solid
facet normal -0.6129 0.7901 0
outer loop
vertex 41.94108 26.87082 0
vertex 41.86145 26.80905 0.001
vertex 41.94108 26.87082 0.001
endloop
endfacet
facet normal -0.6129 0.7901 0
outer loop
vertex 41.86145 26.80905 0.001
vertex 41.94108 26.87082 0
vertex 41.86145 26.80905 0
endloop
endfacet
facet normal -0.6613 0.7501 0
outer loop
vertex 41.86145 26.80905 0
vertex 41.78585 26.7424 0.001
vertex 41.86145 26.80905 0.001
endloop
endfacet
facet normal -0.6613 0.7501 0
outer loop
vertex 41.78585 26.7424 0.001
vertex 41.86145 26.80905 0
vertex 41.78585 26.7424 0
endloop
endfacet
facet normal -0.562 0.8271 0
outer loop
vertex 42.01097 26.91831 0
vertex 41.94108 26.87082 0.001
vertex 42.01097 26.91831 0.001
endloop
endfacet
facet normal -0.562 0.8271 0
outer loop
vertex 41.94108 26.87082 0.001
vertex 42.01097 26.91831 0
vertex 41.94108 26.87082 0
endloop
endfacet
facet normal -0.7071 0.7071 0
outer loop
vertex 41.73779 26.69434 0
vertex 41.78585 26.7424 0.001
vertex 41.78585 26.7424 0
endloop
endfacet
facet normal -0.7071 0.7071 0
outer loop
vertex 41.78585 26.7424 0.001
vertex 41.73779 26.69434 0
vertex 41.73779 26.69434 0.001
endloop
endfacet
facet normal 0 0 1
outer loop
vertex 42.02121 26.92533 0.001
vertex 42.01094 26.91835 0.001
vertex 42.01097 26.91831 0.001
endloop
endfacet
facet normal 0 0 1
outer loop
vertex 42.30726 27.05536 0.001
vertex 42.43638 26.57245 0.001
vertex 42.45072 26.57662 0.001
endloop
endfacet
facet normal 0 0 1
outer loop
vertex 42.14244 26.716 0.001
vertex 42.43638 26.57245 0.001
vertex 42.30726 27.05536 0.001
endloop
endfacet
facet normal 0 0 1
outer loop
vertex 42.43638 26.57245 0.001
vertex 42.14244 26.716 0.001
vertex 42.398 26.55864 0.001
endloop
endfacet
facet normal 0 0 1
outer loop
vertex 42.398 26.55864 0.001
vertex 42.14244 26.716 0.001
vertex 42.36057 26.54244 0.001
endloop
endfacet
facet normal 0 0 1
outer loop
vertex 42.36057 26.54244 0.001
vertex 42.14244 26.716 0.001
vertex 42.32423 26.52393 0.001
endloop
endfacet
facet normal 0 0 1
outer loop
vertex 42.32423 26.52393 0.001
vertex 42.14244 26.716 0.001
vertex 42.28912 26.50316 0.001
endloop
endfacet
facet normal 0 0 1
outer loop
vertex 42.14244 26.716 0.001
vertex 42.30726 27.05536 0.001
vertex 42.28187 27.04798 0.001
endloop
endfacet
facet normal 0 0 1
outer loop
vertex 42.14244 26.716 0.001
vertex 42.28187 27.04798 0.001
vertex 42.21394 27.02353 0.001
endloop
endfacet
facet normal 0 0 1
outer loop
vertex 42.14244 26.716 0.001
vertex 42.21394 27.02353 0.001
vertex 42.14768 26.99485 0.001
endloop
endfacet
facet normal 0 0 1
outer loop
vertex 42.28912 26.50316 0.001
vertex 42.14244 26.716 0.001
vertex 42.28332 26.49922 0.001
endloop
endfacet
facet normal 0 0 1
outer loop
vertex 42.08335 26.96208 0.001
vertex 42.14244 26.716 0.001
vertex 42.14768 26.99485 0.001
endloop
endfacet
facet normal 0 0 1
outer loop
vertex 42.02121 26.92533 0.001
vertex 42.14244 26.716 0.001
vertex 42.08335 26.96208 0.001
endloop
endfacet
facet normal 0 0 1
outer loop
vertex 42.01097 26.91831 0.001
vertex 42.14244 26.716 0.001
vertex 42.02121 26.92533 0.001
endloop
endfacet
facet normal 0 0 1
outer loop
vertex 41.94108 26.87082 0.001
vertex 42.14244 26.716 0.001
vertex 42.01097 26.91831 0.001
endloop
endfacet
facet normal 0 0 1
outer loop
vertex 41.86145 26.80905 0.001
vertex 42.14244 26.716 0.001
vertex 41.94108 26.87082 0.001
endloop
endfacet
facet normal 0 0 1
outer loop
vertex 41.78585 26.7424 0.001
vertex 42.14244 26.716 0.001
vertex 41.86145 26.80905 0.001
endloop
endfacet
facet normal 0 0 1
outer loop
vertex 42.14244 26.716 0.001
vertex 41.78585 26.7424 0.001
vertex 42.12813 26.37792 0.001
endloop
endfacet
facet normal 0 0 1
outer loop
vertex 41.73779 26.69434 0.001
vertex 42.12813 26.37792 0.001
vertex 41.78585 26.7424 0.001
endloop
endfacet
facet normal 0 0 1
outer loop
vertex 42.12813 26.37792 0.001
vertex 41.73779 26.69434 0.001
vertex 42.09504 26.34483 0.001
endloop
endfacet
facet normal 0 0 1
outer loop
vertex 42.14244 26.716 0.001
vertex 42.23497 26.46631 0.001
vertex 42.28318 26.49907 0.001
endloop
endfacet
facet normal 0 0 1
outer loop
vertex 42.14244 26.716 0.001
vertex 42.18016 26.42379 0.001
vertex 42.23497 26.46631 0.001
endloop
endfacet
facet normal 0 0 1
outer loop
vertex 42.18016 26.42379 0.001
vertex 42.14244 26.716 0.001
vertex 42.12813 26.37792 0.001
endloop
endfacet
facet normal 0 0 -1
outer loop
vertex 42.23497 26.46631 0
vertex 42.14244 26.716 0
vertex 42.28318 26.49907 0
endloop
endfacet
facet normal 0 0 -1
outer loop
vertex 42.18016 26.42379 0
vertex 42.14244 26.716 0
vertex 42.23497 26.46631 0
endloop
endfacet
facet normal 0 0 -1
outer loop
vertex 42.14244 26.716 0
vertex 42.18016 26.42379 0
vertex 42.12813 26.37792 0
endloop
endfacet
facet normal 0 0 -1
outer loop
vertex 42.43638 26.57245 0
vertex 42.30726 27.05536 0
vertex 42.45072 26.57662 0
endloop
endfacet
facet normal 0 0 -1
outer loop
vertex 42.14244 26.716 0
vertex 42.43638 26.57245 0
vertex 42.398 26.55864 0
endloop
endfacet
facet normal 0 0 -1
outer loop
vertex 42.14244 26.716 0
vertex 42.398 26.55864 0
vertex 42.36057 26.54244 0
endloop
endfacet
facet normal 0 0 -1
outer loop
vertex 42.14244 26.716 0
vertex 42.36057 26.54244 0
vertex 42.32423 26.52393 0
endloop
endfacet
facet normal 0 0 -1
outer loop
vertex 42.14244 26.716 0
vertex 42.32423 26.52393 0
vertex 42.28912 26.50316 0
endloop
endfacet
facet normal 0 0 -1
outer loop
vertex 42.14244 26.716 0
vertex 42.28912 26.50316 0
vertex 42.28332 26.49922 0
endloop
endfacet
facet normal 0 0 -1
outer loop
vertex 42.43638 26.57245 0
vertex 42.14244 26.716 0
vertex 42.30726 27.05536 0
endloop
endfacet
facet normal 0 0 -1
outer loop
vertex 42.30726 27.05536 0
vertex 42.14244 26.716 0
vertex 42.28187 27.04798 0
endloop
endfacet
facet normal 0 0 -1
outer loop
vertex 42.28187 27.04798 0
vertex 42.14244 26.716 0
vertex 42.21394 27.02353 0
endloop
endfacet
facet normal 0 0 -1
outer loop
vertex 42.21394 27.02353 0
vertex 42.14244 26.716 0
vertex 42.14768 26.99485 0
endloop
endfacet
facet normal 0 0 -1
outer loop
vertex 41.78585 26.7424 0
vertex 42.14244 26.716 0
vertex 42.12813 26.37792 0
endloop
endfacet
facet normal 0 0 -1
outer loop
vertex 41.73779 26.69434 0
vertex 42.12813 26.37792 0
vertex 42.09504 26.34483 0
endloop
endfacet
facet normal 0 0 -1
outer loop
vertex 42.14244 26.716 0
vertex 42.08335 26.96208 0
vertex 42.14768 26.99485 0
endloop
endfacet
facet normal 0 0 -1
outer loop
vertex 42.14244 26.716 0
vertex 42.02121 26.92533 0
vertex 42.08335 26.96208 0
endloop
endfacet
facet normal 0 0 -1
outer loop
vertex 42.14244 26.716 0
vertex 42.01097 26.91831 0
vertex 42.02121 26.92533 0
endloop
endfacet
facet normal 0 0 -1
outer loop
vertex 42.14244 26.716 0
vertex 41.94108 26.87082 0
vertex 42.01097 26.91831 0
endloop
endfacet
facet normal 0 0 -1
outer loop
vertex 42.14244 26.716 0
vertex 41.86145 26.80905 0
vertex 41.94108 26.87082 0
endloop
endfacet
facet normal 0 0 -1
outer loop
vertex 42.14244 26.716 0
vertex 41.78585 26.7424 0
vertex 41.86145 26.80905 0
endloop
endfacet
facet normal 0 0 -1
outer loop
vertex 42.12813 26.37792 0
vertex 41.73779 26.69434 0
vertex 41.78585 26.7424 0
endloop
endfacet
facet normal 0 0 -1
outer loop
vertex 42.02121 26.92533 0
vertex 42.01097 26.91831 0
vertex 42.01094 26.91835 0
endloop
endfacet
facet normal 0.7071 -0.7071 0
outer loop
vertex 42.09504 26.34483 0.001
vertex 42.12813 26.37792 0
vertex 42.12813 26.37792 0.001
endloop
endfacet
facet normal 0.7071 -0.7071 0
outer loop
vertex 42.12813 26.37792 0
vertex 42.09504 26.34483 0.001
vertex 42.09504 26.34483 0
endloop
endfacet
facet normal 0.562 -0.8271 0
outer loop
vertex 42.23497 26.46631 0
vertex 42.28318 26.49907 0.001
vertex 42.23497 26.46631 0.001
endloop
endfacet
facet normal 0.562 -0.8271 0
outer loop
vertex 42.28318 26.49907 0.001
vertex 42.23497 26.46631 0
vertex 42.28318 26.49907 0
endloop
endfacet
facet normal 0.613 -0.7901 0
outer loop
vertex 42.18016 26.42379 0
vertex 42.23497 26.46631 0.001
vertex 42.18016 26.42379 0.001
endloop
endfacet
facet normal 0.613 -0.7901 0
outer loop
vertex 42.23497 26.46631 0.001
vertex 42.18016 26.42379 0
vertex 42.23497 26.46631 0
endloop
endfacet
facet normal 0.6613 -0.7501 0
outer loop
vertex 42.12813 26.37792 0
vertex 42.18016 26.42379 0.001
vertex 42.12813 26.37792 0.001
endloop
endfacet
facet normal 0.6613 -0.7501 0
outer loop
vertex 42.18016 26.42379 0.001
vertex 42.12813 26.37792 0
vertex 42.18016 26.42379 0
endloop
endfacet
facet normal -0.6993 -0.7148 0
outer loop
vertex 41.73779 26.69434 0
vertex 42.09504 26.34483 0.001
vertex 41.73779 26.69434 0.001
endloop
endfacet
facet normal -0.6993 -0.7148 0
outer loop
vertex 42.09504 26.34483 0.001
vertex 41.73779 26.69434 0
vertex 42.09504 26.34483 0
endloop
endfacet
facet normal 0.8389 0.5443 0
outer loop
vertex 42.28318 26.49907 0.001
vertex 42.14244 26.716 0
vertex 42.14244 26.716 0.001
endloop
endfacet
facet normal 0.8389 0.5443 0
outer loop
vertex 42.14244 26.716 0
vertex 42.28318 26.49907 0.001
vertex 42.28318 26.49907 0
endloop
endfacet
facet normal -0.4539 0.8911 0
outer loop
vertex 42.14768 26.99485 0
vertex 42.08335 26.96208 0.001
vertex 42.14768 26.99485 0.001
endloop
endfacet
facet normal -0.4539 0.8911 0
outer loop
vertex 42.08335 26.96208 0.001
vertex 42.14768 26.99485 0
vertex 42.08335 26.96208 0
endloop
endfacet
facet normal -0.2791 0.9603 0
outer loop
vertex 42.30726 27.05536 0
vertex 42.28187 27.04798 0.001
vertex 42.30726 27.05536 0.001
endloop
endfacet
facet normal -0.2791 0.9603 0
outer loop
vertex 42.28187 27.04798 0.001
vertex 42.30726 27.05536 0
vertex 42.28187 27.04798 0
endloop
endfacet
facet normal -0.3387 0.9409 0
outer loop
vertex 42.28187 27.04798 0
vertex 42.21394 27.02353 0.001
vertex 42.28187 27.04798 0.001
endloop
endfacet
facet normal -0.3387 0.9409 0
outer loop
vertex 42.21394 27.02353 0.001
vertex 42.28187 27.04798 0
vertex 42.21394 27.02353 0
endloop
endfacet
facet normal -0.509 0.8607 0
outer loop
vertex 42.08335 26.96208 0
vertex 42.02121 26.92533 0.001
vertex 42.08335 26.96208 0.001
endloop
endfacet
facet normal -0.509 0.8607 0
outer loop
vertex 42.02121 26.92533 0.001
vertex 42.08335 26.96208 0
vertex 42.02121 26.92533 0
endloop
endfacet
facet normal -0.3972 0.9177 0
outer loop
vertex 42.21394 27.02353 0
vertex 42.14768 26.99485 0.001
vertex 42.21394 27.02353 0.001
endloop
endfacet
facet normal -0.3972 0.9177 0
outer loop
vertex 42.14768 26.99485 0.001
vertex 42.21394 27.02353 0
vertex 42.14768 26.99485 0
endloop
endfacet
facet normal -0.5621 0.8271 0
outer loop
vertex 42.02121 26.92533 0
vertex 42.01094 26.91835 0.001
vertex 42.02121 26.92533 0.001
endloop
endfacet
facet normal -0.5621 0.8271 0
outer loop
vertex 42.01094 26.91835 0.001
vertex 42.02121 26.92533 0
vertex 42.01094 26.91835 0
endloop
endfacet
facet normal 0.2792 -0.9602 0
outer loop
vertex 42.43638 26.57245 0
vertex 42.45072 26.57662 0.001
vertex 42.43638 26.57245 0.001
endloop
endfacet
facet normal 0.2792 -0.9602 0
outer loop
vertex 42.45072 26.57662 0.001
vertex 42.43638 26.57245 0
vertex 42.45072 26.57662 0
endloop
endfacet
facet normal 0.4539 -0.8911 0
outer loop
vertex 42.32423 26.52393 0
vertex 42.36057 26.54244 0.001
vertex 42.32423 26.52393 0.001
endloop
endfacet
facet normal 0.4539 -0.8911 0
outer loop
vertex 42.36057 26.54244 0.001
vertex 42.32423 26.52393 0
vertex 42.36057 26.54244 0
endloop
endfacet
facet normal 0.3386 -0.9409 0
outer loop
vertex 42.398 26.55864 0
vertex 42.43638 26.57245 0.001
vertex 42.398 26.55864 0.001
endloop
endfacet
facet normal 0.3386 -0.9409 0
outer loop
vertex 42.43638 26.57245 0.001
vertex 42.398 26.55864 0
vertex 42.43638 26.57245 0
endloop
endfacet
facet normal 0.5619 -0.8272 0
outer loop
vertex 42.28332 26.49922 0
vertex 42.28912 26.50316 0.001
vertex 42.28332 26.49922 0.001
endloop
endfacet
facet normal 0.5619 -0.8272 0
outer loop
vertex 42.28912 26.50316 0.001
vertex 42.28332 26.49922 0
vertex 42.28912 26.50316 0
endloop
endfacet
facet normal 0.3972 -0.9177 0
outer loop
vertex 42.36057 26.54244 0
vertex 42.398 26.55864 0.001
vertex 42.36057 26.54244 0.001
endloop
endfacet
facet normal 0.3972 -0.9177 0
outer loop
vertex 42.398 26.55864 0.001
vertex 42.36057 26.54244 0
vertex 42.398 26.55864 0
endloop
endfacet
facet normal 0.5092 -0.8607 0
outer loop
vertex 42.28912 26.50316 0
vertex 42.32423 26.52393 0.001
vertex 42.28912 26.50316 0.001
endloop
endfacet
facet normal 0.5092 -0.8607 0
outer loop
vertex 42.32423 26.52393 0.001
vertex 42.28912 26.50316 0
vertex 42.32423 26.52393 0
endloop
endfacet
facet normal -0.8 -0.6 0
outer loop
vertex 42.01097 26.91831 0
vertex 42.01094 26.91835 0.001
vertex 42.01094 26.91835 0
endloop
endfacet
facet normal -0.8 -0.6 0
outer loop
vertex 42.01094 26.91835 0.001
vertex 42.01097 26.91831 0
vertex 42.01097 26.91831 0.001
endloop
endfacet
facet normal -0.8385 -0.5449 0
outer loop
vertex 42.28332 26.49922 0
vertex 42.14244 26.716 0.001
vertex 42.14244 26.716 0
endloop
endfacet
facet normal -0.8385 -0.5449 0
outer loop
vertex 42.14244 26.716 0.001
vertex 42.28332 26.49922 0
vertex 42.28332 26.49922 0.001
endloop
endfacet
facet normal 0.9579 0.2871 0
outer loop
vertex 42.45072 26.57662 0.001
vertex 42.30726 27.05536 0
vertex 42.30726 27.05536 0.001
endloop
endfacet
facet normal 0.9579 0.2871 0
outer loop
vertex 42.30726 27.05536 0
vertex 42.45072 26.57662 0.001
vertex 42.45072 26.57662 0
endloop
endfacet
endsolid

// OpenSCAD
$fn=100;
pen_width=0.5;
pen_color= "black";

x_start = 41.916;
y_start = 26.520;
x_end = 42.147;
y_end = 26.709;
i = 0.968;
j = -0.947;

module G2(x_start,y_start,x_end,y_end,i,j)
{
    radius = sqrt(i*i+j*j);
    intersection()
    {
        difference()
        {
            translate([x_start+i,y_start+j,0])
                cylinder(h=0.001,r=radius+pen_width/2);
            translate([x_start+i,y_start+j,-0.001])
                cylinder(h=0.003,r=radius-pen_width/2);
        }
        translate([0,0,-0.001])
            linear_extrude(height=0.003)
                polygon(points = [
                    [x_start+i,y_start+j],
                    [x_start-i,y_start-j],
                    [2*x_end-x_start-i,2*y_end-y_start-j]
                ]);
    }
}

G2(41.916,26.520,42.147,26.709,0.968,-0.947);
G2(42.147,26.709,42.379,26.816,0.490,-0.754);
